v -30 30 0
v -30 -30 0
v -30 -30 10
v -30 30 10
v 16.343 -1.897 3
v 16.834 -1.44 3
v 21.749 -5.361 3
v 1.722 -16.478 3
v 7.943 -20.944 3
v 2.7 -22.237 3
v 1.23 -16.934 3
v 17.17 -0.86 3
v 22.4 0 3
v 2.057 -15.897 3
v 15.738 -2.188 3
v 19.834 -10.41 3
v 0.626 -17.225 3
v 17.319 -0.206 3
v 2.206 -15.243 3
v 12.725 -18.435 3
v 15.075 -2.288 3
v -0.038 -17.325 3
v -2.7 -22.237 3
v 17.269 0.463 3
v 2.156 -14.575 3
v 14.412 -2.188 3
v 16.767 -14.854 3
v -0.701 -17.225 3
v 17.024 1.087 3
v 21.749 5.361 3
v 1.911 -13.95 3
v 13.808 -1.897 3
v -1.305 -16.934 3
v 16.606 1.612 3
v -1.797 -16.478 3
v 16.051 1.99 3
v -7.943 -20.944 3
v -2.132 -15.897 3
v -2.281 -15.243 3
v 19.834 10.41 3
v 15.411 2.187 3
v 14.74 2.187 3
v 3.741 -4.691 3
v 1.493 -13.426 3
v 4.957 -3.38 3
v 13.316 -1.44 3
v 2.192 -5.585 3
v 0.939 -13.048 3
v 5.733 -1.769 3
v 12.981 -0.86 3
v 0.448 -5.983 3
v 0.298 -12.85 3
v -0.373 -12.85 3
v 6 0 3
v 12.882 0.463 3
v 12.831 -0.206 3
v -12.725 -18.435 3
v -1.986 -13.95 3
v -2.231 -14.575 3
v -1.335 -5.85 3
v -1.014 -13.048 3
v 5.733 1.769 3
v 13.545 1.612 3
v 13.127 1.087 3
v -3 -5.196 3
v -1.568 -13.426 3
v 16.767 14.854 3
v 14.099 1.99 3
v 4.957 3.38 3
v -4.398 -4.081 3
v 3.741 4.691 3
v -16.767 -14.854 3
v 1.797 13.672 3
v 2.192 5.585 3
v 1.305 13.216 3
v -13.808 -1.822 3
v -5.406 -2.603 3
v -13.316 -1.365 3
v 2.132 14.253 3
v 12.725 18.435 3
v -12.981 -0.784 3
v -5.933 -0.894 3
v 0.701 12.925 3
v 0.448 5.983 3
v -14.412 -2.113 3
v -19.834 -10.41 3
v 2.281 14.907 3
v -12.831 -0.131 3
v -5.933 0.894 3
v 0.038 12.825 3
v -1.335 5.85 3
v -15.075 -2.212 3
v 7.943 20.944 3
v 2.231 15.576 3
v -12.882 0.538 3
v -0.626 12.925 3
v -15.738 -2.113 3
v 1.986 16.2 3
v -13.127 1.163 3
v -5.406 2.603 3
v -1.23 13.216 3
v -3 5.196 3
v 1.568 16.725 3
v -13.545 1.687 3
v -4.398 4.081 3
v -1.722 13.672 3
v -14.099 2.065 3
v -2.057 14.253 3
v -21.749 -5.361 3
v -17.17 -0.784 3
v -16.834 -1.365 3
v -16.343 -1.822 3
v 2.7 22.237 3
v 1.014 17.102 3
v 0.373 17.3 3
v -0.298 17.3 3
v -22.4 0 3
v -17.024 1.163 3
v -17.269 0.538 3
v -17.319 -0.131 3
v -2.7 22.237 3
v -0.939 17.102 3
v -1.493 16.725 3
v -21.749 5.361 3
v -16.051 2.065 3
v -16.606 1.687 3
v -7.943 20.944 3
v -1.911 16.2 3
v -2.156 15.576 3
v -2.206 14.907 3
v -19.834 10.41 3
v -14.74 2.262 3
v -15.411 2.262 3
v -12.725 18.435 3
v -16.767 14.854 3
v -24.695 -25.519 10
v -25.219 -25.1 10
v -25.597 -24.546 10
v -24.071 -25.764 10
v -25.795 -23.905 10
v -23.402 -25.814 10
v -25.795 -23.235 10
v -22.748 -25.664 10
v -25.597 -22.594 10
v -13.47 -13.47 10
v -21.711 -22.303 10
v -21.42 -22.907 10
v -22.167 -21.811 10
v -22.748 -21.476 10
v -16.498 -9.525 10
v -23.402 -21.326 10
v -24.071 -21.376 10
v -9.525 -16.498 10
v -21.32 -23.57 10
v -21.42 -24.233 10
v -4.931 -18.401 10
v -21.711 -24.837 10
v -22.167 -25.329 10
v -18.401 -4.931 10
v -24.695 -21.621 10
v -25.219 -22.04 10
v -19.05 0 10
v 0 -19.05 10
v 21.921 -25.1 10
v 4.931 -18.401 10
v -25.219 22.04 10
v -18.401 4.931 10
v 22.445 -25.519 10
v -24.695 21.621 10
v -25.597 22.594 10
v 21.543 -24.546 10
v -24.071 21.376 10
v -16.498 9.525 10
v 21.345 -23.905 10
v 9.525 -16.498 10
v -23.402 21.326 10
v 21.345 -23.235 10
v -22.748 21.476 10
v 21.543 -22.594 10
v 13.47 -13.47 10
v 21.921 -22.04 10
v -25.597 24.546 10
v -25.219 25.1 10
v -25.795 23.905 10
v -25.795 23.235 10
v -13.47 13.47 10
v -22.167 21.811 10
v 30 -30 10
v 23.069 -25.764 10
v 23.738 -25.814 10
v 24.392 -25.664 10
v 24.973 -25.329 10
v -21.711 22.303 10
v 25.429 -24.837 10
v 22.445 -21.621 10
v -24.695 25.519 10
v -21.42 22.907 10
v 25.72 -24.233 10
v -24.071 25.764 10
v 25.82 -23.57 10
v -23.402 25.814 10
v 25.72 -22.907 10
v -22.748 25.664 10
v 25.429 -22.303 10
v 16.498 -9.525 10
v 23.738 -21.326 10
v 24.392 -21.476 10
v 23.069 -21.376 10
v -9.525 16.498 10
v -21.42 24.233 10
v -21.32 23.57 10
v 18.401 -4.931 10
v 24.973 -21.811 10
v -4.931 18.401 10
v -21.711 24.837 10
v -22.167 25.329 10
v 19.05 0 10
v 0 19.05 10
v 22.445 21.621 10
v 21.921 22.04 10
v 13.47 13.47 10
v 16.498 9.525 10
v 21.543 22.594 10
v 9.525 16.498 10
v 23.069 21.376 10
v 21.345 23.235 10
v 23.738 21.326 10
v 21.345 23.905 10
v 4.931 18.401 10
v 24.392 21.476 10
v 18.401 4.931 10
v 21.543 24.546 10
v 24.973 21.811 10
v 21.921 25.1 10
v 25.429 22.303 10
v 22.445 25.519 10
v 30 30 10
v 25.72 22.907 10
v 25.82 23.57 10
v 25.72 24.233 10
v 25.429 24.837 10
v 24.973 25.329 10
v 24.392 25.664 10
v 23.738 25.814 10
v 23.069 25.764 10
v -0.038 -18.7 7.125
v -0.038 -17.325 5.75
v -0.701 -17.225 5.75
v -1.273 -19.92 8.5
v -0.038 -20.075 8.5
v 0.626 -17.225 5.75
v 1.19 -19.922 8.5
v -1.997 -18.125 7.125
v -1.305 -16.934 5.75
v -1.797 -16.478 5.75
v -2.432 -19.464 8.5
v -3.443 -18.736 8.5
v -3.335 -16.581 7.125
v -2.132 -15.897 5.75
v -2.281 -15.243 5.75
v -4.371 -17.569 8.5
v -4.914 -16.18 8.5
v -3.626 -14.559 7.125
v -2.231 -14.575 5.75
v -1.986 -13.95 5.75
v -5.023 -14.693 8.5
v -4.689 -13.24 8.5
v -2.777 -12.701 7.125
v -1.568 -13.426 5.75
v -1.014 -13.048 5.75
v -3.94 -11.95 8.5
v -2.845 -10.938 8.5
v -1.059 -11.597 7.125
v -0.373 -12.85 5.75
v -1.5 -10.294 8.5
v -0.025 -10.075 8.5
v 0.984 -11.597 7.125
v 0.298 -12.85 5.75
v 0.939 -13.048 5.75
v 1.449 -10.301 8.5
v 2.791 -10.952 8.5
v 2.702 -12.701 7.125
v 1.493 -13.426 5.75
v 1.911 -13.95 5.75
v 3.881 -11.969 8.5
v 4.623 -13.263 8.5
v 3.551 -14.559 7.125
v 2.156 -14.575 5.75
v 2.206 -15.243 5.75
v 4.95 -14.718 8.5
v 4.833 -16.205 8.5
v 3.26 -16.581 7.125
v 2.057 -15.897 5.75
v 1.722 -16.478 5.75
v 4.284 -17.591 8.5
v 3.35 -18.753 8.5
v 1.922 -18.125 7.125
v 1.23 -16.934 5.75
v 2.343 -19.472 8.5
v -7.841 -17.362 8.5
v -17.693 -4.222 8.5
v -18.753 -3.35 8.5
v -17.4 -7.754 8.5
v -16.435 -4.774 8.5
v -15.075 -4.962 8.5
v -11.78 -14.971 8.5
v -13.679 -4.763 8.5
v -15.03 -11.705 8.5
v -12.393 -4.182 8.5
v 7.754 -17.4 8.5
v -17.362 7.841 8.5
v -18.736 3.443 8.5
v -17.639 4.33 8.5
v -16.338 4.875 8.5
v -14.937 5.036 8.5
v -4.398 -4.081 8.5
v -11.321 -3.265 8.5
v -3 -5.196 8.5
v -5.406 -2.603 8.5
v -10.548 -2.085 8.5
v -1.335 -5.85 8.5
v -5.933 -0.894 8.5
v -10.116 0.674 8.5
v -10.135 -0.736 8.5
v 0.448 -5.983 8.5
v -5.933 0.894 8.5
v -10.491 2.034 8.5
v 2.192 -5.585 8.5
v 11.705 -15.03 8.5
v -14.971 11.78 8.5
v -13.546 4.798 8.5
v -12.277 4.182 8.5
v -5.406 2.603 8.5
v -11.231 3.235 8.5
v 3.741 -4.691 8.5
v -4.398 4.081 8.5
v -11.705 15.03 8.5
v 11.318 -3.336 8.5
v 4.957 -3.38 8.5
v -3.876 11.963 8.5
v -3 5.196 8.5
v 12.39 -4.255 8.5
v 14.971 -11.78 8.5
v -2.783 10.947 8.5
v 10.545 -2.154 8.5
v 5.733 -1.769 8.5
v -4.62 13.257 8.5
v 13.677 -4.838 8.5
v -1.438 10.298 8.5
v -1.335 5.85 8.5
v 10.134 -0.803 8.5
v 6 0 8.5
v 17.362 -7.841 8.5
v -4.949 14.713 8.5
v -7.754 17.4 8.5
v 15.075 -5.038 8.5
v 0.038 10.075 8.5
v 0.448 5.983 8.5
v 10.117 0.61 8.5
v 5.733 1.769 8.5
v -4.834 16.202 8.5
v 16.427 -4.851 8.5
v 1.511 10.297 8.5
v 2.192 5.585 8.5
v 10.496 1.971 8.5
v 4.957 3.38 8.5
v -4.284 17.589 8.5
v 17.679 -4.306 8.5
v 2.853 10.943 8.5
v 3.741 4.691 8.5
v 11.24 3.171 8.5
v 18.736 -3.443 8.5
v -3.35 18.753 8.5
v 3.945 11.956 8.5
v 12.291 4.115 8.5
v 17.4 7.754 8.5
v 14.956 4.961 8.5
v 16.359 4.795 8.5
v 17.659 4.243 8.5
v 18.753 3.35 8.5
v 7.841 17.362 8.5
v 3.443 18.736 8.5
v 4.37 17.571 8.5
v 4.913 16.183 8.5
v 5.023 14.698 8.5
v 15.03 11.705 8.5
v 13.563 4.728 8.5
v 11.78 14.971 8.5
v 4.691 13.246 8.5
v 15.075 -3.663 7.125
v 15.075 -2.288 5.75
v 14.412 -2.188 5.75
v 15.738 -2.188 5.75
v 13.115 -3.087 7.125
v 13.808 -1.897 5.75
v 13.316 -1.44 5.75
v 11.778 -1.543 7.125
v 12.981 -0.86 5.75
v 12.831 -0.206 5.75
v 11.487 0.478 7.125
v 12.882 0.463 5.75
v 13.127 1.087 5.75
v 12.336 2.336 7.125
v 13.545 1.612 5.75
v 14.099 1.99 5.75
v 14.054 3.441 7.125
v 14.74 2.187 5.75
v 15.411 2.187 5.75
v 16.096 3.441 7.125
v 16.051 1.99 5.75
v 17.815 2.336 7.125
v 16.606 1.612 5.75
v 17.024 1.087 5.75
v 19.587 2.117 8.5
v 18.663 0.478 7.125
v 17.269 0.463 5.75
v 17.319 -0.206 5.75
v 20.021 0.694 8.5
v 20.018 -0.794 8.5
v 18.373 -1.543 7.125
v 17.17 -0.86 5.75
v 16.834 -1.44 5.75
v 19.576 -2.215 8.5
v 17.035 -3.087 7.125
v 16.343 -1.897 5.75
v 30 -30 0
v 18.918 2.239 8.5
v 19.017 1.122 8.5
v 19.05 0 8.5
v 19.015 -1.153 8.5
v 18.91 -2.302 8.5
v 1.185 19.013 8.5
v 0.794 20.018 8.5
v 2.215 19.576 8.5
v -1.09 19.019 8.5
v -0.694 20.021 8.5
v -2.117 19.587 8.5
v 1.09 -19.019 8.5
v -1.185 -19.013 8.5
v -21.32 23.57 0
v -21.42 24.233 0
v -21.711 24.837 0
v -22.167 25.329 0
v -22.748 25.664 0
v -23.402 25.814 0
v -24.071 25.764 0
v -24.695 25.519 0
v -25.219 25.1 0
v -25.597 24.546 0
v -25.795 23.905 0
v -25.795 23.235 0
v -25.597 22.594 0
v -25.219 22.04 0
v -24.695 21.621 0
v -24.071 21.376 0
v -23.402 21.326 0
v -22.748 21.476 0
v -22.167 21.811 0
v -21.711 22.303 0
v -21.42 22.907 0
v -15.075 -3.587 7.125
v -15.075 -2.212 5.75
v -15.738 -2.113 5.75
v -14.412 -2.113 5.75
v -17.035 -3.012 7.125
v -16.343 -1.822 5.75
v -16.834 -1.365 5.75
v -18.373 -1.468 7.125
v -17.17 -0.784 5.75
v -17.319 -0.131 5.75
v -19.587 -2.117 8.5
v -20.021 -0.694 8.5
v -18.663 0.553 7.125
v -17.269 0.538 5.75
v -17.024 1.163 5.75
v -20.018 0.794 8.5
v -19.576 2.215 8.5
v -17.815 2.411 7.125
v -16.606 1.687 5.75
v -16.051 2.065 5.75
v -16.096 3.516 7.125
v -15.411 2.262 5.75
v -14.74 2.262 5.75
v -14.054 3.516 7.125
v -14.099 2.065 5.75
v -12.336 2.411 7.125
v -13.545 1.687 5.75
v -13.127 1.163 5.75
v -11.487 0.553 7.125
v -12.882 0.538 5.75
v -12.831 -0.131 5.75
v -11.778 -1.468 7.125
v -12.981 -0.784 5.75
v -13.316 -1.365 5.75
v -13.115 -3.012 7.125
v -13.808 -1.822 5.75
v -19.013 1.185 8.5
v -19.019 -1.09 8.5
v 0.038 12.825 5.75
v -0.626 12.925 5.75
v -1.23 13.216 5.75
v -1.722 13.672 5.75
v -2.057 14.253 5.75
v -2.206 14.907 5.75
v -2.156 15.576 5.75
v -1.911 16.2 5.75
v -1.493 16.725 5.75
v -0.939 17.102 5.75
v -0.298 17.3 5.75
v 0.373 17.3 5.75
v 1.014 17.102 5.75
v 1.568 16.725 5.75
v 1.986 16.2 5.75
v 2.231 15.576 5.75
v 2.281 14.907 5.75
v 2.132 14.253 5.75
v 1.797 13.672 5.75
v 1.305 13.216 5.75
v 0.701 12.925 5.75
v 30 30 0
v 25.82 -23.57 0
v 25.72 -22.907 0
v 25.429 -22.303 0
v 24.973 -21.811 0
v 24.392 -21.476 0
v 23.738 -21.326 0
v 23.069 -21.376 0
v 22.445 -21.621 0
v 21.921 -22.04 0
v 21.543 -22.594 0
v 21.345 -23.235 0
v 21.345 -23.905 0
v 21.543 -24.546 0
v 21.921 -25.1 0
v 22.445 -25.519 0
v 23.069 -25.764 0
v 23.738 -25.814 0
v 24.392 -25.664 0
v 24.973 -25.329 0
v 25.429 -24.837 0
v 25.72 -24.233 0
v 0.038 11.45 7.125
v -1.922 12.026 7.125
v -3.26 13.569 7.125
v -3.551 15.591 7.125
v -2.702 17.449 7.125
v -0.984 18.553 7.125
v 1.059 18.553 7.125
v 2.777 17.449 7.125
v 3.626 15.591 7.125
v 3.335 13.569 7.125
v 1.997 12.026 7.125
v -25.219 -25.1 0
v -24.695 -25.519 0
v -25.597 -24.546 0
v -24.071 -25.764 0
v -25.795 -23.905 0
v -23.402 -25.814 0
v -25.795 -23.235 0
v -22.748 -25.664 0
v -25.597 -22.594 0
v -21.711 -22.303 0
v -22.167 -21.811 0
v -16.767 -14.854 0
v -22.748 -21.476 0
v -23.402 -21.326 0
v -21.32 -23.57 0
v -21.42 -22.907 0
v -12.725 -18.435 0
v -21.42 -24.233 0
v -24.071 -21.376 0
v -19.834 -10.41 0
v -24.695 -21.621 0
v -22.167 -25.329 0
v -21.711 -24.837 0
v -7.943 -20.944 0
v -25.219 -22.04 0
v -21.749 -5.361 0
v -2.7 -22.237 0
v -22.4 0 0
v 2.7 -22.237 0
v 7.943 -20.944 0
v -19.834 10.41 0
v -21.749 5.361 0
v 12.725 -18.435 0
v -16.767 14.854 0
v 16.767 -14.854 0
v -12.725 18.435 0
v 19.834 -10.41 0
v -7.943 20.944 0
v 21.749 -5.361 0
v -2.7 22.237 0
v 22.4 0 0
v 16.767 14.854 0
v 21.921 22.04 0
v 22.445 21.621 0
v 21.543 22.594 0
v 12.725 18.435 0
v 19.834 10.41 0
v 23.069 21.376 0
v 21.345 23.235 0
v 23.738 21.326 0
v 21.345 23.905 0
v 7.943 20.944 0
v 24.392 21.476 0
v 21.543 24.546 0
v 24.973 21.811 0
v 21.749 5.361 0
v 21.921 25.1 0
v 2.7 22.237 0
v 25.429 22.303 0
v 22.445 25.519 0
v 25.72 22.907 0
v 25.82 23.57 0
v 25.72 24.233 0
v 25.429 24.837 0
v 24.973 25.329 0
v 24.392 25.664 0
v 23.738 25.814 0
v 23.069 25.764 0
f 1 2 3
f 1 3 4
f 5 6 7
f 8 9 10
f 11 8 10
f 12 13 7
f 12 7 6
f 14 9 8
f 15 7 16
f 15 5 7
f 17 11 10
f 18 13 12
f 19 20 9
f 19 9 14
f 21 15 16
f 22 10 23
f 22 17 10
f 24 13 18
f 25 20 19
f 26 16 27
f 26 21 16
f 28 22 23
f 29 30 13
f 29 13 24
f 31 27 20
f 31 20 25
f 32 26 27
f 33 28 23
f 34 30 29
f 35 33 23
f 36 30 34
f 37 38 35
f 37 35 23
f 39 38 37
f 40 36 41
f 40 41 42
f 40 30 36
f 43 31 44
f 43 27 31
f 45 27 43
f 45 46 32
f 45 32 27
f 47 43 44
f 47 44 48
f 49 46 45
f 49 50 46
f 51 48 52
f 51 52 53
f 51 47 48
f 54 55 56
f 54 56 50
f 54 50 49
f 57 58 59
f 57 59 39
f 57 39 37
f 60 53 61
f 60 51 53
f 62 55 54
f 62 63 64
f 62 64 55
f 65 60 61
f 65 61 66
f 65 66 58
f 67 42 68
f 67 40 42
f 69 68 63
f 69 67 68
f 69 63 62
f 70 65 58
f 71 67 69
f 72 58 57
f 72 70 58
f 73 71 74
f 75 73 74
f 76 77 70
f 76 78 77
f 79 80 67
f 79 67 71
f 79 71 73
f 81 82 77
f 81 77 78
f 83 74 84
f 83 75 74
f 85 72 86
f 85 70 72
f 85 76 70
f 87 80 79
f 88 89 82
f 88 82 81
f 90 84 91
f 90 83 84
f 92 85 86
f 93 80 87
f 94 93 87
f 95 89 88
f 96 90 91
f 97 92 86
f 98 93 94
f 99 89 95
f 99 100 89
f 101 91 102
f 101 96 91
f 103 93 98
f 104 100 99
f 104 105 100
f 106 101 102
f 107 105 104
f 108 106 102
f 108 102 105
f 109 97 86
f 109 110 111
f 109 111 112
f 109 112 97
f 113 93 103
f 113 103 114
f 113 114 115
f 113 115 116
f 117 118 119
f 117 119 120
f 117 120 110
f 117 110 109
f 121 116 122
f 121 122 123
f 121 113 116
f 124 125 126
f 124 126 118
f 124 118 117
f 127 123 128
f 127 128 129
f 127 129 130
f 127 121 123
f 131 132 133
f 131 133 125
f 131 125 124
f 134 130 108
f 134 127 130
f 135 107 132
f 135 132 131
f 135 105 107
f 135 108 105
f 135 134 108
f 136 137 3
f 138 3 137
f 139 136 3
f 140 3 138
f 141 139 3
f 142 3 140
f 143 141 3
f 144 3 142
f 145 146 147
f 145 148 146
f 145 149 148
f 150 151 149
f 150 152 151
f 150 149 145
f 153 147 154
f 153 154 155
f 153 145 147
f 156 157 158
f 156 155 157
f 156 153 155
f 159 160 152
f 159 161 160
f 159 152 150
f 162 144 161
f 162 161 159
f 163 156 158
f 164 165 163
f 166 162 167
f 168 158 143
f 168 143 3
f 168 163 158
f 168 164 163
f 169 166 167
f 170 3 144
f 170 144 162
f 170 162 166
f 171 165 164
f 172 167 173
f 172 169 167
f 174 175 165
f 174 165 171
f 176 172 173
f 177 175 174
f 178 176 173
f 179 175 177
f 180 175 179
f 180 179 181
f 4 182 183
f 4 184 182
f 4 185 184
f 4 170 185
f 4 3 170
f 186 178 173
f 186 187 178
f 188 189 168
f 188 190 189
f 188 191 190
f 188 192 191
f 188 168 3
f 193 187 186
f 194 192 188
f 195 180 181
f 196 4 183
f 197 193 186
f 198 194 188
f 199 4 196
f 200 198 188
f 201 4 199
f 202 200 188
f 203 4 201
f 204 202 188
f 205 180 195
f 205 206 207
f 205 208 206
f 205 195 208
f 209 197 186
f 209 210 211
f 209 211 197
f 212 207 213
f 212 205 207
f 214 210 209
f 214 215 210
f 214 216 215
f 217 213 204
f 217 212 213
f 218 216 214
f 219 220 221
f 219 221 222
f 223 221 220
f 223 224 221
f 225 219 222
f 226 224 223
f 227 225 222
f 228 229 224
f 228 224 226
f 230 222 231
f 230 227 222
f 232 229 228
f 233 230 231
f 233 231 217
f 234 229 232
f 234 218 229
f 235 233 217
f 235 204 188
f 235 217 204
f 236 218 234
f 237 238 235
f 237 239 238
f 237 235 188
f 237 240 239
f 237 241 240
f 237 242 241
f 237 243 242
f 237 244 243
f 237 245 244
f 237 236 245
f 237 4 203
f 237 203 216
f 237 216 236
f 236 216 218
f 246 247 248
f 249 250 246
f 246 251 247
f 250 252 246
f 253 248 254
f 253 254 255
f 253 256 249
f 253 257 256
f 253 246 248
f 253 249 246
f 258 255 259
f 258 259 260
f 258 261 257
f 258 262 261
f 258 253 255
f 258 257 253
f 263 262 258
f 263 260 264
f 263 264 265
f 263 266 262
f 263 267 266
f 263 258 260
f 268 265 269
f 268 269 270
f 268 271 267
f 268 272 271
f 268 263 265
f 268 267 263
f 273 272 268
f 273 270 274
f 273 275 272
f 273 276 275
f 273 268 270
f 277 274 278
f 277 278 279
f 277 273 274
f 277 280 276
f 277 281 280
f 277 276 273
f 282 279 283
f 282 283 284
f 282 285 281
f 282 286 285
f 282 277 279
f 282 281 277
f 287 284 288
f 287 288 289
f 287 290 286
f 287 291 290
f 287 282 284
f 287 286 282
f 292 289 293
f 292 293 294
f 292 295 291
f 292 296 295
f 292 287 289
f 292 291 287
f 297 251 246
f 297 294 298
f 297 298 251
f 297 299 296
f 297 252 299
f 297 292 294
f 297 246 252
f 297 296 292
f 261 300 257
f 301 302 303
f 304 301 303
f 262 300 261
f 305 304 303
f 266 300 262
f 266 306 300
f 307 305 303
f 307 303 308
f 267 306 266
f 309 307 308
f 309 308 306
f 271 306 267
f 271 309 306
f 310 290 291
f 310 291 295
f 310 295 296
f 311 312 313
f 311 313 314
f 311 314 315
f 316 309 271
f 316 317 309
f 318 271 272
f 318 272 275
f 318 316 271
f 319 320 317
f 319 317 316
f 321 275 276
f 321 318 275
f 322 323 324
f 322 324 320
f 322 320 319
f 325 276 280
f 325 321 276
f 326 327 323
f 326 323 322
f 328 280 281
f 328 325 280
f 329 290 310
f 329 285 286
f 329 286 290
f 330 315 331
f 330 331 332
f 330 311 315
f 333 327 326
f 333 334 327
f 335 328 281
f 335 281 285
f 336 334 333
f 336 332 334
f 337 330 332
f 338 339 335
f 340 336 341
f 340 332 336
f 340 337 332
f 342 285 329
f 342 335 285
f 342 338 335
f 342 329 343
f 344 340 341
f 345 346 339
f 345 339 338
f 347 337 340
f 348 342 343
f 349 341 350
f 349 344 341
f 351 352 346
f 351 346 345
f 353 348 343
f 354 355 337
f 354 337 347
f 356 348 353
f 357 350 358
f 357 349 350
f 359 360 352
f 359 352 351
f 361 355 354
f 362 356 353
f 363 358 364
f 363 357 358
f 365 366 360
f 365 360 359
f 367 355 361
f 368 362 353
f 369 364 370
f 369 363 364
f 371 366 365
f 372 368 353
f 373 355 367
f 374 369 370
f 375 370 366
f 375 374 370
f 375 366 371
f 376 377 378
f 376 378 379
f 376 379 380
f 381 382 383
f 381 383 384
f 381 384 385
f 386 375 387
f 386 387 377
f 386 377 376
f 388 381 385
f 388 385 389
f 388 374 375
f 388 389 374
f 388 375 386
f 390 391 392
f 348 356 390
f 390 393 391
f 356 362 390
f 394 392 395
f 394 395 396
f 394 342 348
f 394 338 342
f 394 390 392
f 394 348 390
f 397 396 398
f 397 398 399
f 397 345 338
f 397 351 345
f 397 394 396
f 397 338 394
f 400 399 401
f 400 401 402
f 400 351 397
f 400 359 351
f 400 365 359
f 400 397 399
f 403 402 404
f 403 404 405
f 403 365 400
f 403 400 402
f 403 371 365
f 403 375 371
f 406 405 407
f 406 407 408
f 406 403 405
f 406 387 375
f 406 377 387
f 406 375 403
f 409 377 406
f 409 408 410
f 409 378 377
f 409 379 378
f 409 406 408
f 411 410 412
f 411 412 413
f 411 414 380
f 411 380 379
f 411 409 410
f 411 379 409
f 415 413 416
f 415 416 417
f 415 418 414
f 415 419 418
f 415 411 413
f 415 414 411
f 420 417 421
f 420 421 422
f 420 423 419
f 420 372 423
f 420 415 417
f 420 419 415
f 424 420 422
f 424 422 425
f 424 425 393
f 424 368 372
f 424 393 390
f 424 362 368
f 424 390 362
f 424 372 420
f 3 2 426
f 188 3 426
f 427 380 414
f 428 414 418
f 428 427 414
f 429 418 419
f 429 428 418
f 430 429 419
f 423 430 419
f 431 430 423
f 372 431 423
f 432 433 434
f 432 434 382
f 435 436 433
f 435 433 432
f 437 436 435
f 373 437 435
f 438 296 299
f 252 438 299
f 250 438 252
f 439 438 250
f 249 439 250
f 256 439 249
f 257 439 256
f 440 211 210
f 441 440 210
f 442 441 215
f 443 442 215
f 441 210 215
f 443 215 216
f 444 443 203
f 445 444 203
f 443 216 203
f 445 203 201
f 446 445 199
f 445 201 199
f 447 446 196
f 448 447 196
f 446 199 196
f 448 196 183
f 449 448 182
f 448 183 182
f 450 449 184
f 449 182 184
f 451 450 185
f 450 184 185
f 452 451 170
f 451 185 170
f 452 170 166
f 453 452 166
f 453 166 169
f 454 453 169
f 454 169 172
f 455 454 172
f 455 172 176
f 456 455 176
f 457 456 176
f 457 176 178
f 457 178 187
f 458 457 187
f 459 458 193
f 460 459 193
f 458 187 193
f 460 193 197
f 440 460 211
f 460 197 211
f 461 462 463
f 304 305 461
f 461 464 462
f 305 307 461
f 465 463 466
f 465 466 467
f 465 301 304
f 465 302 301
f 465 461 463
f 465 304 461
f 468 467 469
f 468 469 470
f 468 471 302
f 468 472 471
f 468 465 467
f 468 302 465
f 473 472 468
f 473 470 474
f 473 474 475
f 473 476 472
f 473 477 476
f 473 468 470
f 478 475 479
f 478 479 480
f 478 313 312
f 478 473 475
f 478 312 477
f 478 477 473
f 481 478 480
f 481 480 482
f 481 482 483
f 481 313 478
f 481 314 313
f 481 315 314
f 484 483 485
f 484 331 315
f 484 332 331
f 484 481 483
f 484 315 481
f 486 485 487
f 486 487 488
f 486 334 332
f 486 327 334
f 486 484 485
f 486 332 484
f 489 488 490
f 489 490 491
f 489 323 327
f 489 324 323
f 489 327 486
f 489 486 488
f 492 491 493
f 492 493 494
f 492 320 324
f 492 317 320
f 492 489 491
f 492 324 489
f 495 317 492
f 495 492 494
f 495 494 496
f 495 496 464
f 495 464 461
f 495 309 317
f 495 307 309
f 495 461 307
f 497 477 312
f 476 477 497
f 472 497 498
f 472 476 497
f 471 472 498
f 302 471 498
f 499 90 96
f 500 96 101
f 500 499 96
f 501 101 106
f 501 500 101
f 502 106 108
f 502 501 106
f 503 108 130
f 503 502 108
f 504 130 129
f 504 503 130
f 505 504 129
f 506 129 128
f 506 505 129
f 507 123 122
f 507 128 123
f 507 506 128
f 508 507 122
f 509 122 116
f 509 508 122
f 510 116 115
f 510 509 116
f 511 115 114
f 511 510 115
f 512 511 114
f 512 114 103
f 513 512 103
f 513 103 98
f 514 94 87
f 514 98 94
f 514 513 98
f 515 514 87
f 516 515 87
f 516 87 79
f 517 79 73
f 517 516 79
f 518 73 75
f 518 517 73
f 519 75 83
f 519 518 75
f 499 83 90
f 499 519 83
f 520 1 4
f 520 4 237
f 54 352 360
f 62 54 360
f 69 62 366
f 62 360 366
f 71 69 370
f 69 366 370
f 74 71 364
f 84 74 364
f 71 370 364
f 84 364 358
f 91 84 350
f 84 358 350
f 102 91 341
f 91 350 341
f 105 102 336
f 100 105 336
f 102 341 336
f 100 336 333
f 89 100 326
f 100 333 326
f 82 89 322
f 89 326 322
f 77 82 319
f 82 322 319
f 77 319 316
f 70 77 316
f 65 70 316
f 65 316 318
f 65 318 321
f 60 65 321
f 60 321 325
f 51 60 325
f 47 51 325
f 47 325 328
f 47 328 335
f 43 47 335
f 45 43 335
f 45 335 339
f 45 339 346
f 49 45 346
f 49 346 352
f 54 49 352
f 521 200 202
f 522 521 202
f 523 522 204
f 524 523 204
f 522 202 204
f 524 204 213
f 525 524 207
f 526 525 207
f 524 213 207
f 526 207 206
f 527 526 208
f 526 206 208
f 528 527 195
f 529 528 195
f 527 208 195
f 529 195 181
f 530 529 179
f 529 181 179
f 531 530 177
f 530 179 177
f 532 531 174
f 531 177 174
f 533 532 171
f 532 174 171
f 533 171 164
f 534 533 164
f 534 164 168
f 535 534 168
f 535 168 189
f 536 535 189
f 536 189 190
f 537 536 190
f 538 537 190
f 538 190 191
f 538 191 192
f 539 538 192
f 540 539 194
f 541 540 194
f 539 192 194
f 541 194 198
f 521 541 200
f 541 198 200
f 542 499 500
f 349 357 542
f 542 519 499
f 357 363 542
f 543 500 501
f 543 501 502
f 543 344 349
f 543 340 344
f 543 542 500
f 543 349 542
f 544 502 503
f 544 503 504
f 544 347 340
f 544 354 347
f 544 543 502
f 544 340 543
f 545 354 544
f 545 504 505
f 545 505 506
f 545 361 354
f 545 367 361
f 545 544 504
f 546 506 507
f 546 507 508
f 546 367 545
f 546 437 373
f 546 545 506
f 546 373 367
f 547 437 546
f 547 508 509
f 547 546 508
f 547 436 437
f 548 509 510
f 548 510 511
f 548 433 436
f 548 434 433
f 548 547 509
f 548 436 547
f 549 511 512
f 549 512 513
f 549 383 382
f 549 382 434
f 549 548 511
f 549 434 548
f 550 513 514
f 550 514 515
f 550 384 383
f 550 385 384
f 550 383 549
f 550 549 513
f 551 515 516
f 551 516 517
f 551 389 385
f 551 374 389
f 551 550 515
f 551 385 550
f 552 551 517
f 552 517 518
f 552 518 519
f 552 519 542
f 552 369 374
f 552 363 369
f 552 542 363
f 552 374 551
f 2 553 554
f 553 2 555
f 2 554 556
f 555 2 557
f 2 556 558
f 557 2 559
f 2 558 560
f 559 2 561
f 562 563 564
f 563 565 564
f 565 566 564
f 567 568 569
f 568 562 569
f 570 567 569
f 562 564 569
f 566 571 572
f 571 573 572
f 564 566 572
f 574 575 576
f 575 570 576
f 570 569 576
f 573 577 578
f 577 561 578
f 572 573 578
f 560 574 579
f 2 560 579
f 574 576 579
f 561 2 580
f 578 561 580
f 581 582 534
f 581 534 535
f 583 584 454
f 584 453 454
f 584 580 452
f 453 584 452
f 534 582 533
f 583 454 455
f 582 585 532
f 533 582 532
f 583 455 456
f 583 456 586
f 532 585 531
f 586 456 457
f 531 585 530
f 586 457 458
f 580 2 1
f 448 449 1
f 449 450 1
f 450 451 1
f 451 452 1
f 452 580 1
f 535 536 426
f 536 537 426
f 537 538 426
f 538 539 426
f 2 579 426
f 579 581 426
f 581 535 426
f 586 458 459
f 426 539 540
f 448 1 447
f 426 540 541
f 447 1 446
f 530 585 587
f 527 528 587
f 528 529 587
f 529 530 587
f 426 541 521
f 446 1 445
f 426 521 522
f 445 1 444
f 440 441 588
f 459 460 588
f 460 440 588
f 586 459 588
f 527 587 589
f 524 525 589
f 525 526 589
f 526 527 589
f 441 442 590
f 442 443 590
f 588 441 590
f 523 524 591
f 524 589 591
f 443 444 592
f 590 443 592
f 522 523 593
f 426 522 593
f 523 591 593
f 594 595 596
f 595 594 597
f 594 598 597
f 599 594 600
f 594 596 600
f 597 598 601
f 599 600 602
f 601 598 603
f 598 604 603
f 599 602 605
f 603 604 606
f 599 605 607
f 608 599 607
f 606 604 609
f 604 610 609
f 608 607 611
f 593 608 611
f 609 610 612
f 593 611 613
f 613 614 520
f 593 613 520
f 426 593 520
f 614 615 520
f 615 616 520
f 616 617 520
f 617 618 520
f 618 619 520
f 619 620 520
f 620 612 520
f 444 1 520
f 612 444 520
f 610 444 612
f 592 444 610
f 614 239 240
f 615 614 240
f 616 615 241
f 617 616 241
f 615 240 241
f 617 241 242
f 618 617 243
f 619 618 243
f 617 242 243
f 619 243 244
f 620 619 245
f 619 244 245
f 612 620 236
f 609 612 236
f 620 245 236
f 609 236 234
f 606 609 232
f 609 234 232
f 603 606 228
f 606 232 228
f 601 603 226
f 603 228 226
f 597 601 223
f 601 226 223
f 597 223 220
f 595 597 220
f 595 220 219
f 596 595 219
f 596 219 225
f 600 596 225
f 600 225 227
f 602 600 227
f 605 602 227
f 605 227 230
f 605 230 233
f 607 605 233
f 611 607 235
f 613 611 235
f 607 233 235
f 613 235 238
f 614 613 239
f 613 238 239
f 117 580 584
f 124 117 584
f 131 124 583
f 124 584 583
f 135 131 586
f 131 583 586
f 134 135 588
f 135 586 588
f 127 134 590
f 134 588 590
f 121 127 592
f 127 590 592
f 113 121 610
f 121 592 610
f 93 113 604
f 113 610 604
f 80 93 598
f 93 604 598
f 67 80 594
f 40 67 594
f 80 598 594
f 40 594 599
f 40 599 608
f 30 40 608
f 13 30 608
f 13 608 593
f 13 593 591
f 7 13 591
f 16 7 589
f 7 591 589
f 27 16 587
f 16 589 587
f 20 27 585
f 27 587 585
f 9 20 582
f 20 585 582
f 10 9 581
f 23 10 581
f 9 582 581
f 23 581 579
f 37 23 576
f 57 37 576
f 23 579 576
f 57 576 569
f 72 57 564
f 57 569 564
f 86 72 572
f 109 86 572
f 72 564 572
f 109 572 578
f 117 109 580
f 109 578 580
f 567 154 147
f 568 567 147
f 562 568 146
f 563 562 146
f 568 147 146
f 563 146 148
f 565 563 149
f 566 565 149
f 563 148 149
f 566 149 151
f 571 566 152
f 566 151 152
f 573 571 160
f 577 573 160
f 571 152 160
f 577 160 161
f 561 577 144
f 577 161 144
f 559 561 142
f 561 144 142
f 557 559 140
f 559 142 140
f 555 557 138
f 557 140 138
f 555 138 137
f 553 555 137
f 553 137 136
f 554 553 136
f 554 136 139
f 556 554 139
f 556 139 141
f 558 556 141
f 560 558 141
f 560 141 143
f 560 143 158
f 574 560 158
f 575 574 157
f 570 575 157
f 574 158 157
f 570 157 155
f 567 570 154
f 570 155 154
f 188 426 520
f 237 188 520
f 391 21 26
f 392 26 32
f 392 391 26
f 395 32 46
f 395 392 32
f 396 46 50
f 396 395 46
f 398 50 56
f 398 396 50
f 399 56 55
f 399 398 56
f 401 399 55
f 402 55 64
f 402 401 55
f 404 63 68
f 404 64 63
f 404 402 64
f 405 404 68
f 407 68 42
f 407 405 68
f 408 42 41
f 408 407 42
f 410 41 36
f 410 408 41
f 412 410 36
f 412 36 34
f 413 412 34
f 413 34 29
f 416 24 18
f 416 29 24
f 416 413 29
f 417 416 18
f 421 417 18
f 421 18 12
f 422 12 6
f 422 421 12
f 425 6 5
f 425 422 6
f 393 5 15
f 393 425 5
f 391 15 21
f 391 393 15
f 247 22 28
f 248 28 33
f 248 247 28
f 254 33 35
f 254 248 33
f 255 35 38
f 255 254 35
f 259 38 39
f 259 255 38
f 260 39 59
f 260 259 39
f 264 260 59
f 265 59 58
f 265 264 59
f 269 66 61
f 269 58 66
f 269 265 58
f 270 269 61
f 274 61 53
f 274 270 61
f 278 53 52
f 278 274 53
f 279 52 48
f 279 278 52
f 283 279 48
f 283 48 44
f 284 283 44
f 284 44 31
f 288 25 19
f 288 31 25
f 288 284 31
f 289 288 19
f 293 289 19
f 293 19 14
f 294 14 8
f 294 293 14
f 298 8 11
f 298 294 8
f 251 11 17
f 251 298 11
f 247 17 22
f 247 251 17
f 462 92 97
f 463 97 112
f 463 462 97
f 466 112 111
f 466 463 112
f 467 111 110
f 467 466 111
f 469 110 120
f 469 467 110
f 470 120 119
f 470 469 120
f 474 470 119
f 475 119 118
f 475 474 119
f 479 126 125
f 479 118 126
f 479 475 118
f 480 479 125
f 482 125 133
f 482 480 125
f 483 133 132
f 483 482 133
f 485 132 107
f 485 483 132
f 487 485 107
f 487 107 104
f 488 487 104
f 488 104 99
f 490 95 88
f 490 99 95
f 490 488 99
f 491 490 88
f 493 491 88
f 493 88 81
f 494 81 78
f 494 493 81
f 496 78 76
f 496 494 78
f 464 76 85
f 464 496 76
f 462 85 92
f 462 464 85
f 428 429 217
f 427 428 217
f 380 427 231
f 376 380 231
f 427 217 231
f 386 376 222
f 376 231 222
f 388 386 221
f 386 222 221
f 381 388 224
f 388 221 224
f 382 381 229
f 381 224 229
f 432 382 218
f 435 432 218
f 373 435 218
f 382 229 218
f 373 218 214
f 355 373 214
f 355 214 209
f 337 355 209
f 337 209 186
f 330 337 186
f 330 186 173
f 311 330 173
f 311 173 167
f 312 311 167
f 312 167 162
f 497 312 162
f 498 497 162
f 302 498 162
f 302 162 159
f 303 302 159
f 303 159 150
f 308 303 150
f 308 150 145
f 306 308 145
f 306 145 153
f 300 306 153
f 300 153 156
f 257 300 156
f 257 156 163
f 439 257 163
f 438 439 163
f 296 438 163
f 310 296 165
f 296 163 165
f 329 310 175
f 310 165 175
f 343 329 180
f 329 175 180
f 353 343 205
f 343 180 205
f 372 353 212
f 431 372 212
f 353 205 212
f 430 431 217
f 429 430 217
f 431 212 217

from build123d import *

# Parameters (mm, degrees)
SKETCH1_W                           = 60
SKETCH1_H                           = 60
BOSS_EXTRUDE1_DEPTH                 = 10
SKETCH2_R                           = 6
CUT_EXTRUDE1_DEPTH                  = 10
SKETCH3_R                           = 19.05
CUT_EXTRUDE2_DEPTH                  = 1.5
SKETCH4_R                           = 2.25
CUT_EXTRUDE3_DEPTH                  = 10
F_4_5_4_5_DIAMETER_HOLE1_AT_2_COUNT = 2
F_4_5_4_5_DIAMETER_HOLE1_AT_2_PITCH = 30.150470286
F_4_5_4_5_DIAMETER_HOLE1_AT_3_COUNT = 2
F_4_5_4_5_DIAMETER_HOLE1_AT_3_PITCH = 21.319601995
F_4_5_4_5_DIAMETER_HOLE1_AT_4_COUNT = 2
F_4_5_4_5_DIAMETER_HOLE1_AT_4_PITCH = 21.319601995
SKETCH6_R                           = 22.4
CUT_EXTRUDE4_DEPTH                  = 3


with BuildPart() as part:
    # Sketch1 → Boss-Extrude1 (new body)
    with BuildSketch(Plane.XY):
        Rectangle(SKETCH1_W, SKETCH1_H)
    extrude(amount=BOSS_EXTRUDE1_DEPTH)

    # Sketch2 → Cut-Extrude1 (cut)
    with BuildSketch(Plane.XY.offset(10)):
        Circle(SKETCH2_R)
    extrude(amount=-CUT_EXTRUDE1_DEPTH, mode=Mode.SUBTRACT)

    # Sketch3 → Cut-Extrude2 (cut)
    with BuildSketch(Plane.XY.offset(10)):
        Circle(SKETCH3_R)
    extrude(amount=-CUT_EXTRUDE2_DEPTH, mode=Mode.SUBTRACT)

    # Sketch4 → Cut-Extrude3 (cut)
    with BuildSketch(Plane.XY.offset(10)):
        with Locations((-23.57, 23.57)):
            Circle(SKETCH4_R)
        with Locations((23.57, 23.57)):
            Circle(SKETCH4_R)
        with Locations((23.57, -23.57)):
            Circle(SKETCH4_R)
        with Locations((-23.57, -23.57)):
            Circle(SKETCH4_R)
    extrude(amount=-CUT_EXTRUDE3_DEPTH, mode=Mode.SUBTRACT)

    # Sketch5 → Ø4.5 (4.5) Diameter Hole1 (revolve, cut)
    with BuildSketch(Plane(origin=(-15.075188443, 0.037523467, 8.5), x_dir=(0, -1, 0), z_dir=(1, 0, 0))):
        Polygon((0, 0), (0, 16.351936393), (2.25, 15), (2.25, 2.75), (5, 0), align=None)
    f_4_5_4_5_diameter_hole1 = revolve(axis=Axis((-15.075188443, 0.037523467, 14.85), (0, 0, -1)), mode=Mode.SUBTRACT)

    # Ø4.5 (4.5) Diameter Hole1 at 2: Ø4.5 (4.5) Diameter Hole1 ×2
    with Locations(*[Vector(0.9999969022354874, -0.0024890800366937364, 0) * (i * F_4_5_4_5_DIAMETER_HOLE1_AT_2_PITCH) for i in range(1, F_4_5_4_5_DIAMETER_HOLE1_AT_2_COUNT)]):
        add(f_4_5_4_5_diameter_hole1, mode=Mode.SUBTRACT)

    # Ø4.5 (4.5) Diameter Hole1 at 3: Ø4.5 (4.5) Diameter Hole1 ×2
    with Locations(*[Vector(0.7088646361091163, 0.705344545363392, 0) * (i * F_4_5_4_5_DIAMETER_HOLE1_AT_3_PITCH) for i in range(1, F_4_5_4_5_DIAMETER_HOLE1_AT_3_COUNT)]):
        add(f_4_5_4_5_diameter_hole1, mode=Mode.SUBTRACT)

    # Ø4.5 (4.5) Diameter Hole1 at 4: Ø4.5 (4.5) Diameter Hole1 ×2
    with Locations(*[Vector(0.705344545363392, -0.7088646361091163, 0) * (i * F_4_5_4_5_DIAMETER_HOLE1_AT_4_PITCH) for i in range(1, F_4_5_4_5_DIAMETER_HOLE1_AT_4_COUNT)]):
        add(f_4_5_4_5_diameter_hole1, mode=Mode.SUBTRACT)

    # Sketch6 → Cut-Extrude4 (cut)
    with BuildSketch(Plane(origin=(0, 0, 0), x_dir=(-1, 0, 0), z_dir=(0, 0, -1))):
        Circle(SKETCH6_R)
    extrude(amount=-CUT_EXTRUDE4_DEPTH, mode=Mode.SUBTRACT)


solid = part.part
